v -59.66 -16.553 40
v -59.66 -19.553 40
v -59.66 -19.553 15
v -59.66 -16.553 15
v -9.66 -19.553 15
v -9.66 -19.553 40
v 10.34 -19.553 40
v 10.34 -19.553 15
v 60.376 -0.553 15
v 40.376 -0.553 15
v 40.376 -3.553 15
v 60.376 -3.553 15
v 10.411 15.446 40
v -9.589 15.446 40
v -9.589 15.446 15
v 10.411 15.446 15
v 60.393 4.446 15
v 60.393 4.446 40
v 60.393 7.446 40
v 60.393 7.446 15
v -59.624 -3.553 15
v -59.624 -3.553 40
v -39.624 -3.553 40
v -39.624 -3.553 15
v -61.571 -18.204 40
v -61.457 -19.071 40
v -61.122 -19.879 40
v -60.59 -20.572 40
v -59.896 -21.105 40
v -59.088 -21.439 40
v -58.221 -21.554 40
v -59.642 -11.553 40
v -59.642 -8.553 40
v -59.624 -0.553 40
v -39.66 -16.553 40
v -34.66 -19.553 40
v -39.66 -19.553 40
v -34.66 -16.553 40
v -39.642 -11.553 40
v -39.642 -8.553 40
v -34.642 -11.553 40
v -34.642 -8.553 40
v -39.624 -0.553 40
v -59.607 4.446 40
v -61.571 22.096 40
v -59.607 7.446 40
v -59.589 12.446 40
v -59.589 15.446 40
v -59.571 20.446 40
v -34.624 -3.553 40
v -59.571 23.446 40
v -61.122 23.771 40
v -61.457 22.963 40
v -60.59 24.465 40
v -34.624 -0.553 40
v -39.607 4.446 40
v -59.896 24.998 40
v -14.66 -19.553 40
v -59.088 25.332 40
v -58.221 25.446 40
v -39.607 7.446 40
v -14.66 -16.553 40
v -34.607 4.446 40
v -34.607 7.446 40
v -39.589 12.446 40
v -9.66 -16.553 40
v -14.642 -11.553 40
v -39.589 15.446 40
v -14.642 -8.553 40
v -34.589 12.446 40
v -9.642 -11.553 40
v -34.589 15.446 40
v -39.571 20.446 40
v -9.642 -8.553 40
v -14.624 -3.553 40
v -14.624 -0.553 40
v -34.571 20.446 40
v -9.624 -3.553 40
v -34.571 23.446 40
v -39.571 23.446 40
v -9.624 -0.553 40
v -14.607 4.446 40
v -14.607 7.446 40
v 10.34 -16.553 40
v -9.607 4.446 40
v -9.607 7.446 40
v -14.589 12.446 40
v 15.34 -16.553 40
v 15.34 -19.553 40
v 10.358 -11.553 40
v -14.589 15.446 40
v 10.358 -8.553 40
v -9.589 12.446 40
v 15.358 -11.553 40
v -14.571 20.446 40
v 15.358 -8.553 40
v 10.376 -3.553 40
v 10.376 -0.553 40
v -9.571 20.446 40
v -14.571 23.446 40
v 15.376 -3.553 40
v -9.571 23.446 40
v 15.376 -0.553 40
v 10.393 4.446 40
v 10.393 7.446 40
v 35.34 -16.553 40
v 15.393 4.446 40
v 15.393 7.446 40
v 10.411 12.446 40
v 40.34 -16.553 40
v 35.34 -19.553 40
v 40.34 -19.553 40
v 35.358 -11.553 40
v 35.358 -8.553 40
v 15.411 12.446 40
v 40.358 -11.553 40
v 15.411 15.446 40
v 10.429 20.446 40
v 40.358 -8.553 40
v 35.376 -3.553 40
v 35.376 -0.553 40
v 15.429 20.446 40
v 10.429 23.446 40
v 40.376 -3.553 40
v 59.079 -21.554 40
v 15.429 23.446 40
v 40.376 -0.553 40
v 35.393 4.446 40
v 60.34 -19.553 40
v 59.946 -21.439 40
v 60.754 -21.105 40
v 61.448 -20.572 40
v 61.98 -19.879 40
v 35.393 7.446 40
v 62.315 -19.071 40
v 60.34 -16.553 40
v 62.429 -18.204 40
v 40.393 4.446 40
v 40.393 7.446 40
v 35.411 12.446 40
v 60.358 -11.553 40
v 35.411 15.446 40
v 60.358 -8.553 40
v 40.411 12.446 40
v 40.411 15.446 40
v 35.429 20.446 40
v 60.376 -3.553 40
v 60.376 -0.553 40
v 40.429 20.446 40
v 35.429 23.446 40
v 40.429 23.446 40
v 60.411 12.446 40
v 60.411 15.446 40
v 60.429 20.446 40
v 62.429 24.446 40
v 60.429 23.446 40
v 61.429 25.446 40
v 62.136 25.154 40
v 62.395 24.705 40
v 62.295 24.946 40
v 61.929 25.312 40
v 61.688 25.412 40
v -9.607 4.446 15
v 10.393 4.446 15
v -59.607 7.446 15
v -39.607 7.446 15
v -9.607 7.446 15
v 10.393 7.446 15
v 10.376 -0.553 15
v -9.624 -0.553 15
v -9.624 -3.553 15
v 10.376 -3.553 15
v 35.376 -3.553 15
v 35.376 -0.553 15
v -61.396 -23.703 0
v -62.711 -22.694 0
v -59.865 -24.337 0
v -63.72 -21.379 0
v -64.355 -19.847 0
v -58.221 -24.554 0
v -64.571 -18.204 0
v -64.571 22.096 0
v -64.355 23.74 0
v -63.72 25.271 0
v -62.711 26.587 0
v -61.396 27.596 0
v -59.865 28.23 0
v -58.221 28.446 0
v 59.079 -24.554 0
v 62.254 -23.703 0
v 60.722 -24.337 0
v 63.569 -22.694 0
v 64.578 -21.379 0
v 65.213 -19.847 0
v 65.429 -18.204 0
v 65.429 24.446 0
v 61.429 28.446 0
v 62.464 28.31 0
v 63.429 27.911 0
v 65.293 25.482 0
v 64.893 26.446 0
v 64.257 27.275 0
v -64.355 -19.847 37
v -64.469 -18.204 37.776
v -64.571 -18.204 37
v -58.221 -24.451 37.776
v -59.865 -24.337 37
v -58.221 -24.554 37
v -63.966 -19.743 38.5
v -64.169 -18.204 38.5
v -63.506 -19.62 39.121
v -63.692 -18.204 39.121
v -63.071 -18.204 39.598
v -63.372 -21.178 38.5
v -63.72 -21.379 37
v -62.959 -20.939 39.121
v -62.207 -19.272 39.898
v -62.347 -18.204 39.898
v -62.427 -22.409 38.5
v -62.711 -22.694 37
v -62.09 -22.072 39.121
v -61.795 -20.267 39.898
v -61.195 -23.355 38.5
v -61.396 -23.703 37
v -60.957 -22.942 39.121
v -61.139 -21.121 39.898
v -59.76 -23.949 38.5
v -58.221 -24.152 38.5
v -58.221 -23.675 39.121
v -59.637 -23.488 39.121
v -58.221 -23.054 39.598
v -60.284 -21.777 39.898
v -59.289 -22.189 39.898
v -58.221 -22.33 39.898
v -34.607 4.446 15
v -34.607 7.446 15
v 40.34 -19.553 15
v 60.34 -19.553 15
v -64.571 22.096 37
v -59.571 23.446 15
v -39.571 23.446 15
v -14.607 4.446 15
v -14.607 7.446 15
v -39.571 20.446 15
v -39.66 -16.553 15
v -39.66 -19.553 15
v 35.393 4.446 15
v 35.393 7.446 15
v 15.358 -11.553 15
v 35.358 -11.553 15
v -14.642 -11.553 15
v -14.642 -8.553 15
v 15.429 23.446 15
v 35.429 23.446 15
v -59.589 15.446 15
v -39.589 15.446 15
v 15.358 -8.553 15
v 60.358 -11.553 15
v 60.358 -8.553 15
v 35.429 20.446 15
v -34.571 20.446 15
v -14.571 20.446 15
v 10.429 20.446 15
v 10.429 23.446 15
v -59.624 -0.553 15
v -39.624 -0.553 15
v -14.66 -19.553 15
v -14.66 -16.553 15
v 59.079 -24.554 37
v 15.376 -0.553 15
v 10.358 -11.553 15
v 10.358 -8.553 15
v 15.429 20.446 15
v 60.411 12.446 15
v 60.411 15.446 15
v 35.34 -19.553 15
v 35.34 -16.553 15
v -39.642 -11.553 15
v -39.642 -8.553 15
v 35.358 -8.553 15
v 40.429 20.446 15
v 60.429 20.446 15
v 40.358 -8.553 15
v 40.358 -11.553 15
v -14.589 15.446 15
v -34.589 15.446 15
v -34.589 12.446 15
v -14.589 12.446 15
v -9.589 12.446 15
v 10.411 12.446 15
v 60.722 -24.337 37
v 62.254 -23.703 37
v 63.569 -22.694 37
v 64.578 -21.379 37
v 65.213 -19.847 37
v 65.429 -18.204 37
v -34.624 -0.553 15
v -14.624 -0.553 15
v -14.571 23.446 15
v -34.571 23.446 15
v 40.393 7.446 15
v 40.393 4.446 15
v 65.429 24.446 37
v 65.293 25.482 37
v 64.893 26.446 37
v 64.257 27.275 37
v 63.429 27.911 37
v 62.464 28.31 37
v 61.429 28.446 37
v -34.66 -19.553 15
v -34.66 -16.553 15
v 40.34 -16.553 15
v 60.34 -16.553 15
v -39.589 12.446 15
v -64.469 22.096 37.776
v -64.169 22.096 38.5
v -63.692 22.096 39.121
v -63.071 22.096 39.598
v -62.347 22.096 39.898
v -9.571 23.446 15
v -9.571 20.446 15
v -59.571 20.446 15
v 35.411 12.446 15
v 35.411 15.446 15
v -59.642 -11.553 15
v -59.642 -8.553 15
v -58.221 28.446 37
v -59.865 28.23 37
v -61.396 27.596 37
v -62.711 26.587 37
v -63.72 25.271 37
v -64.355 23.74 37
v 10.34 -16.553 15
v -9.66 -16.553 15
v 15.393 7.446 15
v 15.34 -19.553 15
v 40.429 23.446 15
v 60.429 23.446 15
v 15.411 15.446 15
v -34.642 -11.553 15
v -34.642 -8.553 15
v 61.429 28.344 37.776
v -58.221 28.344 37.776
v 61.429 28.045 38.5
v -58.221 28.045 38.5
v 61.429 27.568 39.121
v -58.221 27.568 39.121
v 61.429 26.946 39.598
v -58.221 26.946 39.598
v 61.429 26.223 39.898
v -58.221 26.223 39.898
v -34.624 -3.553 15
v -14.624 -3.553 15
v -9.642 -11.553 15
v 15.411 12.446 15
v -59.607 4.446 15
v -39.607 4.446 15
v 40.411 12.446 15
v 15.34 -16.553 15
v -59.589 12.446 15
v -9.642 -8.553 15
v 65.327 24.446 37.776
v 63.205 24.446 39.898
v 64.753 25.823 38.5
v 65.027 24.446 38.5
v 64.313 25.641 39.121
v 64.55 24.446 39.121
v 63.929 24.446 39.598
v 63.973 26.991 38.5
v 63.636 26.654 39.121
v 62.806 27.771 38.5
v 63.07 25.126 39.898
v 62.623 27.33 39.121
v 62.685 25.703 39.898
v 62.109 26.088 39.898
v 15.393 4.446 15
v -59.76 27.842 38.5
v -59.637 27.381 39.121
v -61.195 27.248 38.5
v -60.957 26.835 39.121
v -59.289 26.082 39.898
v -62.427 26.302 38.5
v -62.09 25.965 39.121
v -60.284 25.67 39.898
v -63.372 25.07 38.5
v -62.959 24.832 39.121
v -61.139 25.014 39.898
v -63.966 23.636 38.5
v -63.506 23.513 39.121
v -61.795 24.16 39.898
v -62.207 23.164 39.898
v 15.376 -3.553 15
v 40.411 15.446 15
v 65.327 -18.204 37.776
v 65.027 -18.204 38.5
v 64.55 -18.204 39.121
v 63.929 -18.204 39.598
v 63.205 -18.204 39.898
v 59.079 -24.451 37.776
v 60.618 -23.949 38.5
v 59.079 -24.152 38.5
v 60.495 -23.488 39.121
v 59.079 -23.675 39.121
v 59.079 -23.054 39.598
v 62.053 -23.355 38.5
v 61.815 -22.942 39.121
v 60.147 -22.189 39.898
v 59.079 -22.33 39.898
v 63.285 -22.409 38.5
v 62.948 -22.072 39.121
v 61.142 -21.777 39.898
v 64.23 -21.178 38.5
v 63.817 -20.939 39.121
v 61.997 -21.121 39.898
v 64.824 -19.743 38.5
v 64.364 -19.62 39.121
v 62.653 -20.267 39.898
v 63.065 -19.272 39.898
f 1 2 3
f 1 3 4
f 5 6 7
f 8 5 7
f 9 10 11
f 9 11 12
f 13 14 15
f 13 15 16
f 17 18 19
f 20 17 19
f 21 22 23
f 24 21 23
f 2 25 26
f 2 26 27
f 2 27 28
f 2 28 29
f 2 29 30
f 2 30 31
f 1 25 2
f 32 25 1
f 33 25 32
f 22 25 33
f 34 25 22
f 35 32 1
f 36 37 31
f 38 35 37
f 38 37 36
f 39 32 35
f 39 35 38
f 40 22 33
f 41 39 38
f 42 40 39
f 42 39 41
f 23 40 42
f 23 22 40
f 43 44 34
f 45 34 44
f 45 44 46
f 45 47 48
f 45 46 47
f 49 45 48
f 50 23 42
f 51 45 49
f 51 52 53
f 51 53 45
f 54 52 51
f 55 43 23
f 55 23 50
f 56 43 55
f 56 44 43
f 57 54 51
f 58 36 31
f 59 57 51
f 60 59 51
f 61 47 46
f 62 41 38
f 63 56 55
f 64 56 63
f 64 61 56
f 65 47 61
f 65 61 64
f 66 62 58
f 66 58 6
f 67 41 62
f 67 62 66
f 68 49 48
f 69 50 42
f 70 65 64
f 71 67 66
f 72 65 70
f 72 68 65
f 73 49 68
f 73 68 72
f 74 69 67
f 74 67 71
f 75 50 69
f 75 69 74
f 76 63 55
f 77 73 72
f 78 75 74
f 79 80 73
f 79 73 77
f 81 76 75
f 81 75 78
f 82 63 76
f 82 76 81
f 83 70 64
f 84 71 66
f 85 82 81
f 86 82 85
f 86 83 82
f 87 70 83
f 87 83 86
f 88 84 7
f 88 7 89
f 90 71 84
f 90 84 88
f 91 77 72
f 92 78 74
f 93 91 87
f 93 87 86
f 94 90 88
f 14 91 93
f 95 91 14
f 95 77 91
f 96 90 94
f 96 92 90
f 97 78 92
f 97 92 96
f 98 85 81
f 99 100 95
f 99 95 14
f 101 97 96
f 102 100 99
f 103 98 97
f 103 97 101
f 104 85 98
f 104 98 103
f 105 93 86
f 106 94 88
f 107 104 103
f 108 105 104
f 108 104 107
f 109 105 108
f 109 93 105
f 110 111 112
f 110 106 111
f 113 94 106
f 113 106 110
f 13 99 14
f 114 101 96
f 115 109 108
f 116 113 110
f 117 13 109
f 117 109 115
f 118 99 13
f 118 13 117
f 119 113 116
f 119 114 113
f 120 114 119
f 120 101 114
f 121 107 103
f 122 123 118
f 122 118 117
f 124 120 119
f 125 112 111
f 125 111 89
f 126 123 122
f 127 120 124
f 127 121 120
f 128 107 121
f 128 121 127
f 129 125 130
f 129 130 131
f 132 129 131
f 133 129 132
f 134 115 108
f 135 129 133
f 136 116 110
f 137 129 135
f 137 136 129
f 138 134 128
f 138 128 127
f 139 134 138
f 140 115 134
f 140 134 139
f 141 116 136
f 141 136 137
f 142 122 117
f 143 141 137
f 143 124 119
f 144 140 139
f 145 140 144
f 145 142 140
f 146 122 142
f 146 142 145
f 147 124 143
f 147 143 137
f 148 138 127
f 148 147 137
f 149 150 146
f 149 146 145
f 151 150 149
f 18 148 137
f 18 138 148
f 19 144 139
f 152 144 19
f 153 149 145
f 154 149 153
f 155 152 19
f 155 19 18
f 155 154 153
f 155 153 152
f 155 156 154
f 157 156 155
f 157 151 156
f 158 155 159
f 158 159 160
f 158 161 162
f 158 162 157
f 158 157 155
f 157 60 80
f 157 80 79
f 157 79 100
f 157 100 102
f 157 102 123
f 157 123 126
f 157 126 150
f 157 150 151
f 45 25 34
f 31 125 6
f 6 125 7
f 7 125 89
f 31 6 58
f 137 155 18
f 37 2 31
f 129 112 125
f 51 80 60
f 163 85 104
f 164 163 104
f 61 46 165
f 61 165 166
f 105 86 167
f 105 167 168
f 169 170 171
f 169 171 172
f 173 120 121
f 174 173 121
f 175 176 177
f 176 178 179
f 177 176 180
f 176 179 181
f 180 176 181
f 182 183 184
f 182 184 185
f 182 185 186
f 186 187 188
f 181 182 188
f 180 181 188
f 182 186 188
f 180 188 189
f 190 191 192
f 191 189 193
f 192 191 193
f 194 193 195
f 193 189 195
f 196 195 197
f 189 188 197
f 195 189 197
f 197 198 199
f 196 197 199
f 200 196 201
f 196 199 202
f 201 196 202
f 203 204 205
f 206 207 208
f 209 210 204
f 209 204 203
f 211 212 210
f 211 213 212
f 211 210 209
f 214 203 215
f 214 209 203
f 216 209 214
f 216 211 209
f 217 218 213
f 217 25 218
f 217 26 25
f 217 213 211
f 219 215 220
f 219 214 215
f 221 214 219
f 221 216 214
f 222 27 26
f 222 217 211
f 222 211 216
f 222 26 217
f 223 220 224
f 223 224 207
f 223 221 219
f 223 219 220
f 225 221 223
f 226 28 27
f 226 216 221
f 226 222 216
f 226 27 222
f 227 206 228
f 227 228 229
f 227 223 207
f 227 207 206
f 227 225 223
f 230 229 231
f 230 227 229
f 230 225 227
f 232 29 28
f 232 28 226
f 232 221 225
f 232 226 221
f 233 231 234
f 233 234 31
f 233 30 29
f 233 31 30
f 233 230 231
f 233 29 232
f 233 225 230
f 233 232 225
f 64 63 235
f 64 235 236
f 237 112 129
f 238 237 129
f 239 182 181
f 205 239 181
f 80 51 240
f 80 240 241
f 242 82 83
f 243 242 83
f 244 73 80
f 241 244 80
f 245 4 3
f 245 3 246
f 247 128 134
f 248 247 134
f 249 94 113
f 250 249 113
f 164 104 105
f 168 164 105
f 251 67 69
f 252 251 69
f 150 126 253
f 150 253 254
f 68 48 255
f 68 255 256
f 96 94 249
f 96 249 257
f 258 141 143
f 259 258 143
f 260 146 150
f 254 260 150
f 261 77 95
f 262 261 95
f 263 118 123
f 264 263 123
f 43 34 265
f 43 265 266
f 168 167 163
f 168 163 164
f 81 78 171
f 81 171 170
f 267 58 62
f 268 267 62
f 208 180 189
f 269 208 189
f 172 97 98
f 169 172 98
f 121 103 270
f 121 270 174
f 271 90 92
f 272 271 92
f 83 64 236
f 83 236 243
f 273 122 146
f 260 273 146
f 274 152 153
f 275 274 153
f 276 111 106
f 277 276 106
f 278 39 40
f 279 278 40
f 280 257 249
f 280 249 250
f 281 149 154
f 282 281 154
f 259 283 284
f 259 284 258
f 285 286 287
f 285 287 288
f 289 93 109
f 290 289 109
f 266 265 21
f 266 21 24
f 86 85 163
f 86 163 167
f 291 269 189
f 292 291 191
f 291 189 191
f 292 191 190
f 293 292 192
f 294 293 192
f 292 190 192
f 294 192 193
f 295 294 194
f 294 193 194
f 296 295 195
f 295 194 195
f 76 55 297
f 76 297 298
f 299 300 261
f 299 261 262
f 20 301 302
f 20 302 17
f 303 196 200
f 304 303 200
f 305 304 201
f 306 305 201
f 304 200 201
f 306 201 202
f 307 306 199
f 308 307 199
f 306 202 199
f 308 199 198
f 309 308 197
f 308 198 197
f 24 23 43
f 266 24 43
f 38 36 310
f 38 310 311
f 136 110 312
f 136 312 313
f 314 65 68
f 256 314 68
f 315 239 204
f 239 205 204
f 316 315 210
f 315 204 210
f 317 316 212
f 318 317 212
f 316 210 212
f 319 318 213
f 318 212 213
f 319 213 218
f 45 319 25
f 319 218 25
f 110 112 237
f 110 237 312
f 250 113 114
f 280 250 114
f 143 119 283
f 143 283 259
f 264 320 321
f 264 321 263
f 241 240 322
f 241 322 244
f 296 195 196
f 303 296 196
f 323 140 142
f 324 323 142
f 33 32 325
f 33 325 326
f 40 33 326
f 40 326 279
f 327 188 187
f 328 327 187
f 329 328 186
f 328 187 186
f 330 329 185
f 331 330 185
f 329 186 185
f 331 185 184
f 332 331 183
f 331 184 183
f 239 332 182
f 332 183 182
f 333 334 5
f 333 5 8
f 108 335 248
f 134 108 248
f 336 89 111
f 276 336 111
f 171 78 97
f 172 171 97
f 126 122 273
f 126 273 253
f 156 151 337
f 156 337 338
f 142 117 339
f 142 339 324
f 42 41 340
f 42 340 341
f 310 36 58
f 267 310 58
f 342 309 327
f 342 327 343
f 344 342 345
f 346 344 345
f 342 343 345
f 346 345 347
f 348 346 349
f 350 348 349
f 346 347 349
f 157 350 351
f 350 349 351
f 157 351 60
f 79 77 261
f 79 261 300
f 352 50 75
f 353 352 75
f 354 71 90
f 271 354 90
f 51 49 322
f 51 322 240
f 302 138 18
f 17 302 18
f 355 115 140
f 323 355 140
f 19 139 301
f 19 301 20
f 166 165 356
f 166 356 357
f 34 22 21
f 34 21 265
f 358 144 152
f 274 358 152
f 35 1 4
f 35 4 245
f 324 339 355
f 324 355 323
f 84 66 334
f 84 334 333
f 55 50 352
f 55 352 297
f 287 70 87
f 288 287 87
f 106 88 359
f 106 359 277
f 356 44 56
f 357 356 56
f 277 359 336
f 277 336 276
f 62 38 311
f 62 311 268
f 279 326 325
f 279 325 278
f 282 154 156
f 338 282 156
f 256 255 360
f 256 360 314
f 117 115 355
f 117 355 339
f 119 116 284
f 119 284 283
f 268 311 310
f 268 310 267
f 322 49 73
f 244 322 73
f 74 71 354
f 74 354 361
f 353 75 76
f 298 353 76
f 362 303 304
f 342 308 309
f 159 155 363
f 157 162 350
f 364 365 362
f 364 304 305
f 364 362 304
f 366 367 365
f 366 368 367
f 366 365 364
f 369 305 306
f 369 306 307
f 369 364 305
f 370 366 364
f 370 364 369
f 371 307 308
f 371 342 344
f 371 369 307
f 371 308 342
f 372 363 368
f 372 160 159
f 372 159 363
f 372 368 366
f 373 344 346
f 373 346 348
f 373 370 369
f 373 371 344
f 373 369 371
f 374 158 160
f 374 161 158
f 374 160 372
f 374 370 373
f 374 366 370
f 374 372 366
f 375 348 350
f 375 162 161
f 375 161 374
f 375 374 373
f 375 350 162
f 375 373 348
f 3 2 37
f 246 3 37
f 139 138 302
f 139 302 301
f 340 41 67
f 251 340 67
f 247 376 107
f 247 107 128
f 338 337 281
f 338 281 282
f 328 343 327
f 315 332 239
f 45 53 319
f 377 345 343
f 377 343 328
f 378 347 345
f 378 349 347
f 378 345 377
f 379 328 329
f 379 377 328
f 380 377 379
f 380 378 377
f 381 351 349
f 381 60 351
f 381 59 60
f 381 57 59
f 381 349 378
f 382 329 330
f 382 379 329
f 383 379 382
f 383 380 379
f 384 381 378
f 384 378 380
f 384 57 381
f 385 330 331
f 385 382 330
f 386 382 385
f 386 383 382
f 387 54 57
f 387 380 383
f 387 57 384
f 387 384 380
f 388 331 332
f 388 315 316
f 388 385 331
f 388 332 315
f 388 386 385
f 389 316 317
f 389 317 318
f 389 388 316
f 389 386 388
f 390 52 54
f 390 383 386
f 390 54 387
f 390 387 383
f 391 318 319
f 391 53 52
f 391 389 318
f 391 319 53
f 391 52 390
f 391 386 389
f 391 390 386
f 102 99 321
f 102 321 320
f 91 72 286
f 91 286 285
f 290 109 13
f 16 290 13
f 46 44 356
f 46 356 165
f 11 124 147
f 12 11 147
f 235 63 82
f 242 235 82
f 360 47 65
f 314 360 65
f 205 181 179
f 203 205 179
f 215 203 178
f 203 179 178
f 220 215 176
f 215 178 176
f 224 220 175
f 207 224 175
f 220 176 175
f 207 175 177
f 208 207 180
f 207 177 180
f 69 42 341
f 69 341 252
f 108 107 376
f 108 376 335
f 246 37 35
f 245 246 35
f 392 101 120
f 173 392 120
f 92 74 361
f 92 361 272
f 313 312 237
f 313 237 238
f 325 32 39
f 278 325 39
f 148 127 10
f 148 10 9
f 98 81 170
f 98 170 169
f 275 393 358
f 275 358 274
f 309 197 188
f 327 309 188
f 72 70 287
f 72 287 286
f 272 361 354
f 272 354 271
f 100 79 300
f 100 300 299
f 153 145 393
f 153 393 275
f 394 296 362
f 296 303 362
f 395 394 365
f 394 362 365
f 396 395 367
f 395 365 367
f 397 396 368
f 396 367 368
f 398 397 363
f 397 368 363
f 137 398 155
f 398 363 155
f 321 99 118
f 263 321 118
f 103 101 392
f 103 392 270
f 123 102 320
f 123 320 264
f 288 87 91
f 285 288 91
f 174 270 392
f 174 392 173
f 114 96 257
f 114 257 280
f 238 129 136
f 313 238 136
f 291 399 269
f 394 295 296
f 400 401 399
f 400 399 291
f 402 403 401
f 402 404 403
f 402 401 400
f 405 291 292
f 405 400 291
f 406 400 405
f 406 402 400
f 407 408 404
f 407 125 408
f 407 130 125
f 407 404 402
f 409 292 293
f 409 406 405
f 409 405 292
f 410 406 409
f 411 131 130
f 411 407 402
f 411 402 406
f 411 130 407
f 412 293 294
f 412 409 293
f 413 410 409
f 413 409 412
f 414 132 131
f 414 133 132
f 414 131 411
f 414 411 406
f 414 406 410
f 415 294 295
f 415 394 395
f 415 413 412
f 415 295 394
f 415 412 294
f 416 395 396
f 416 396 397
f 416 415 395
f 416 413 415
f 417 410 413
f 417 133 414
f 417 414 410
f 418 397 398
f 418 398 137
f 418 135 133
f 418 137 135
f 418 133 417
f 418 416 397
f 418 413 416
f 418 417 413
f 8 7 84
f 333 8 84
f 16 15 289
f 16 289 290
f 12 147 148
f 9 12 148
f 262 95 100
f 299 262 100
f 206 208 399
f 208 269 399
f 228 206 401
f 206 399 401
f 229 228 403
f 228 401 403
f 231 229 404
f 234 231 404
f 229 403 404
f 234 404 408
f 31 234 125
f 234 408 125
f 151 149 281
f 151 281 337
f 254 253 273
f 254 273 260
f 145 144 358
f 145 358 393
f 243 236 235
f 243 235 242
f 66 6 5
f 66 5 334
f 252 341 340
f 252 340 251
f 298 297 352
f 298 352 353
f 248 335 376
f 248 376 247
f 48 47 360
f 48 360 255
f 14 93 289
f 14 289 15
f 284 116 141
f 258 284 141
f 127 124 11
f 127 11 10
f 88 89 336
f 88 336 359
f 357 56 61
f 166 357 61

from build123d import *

# Parameters (mm, degrees)
F1_DEPTH = 40
F2_W     = 20
F2_H     = 3
F3_DEPTH = 25
F4_R     = 3


with BuildPart() as f1:
    # F0 (on Top) → F1 (new body)
    with BuildSketch(Plane.XY):
        with BuildLine():
            Line((61.428977, 28.446451), (-58.221023, 28.446451))
            ThreePointArc((-58.221023, 28.446451), (-62.711151, 26.586579), (-64.571023, 22.096451))
            Line((-64.571023, 22.096451), (-64.571023, -18.203549))
            ThreePointArc((-64.571023, -18.203549), (-62.711151, -22.693677), (-58.221023, -24.553549))
            Line((-58.221023, -24.553549), (59.078977, -24.553549))
            ThreePointArc((59.078977, -24.553549), (63.569105, -22.693677), (65.428977, -18.203549))
            Line((65.428977, -18.203549), (65.428977, 24.446451))
            ThreePointArc((65.428977, 24.446451), (64.257404, 27.274878), (61.428977, 28.446451))
        make_face()
    extrude(amount=F1_DEPTH)

    # F2 (on face) → F3 (cut)
    with BuildSketch(Plane.XY.offset(40)):
        with Locations((-49.571023, 21.946451)):
            Rectangle(F2_W, F2_H)
        with Locations((-49.588825, 13.946471)):
            Rectangle(F2_W, F2_H)
        with Locations((-49.606627, 5.94649)):
            Rectangle(F2_W, F2_H)
        with Locations((-49.624429, -2.05349)):
            Rectangle(F2_W, F2_H)
        with Locations((-49.642231, -10.05347)):
            Rectangle(F2_W, F2_H)
        with Locations((-49.660033, -18.05345)):
            Rectangle(F2_W, F2_H)
        with Locations((-24.571023, 21.946451)):
            Rectangle(F2_W, F2_H)
        with Locations((-24.588825, 13.946471)):
            Rectangle(F2_W, F2_H)
        with Locations((-24.606627, 5.94649)):
            Rectangle(F2_W, F2_H)
        with Locations((-24.624429, -2.05349)):
            Rectangle(F2_W, F2_H)
        with Locations((-24.642231, -10.05347)):
            Rectangle(F2_W, F2_H)
        with Locations((-24.660033, -18.05345)):
            Rectangle(F2_W, F2_H)
        with Locations((0.428977, 21.946451)):
            Rectangle(F2_W, F2_H)
        with Locations((0.411175, 13.946471)):
            Rectangle(F2_W, F2_H)
        with Locations((0.393373, 5.94649)):
            Rectangle(F2_W, F2_H)
        with Locations((0.375571, -2.05349)):
            Rectangle(F2_W, F2_H)
        with Locations((0.357769, -10.05347)):
            Rectangle(F2_W, F2_H)
        with Locations((0.339967, -18.05345)):
            Rectangle(F2_W, F2_H)
        with Locations((25.428977, 21.946451)):
            Rectangle(F2_W, F2_H)
        with Locations((25.411175, 13.946471)):
            Rectangle(F2_W, F2_H)
        with Locations((25.393373, 5.94649)):
            Rectangle(F2_W, F2_H)
        with Locations((25.375571, -2.05349)):
            Rectangle(F2_W, F2_H)
        with Locations((25.357769, -10.05347)):
            Rectangle(F2_W, F2_H)
        with Locations((25.339967, -18.05345)):
            Rectangle(F2_W, F2_H)
        with Locations((50.428977, 21.946451)):
            Rectangle(F2_W, F2_H)
        with Locations((50.411175, 13.946471)):
            Rectangle(F2_W, F2_H)
        with Locations((50.393373, 5.94649)):
            Rectangle(F2_W, F2_H)
        with Locations((50.375571, -2.05349)):
            Rectangle(F2_W, F2_H)
        with Locations((50.357769, -10.05347)):
            Rectangle(F2_W, F2_H)
        with Locations((50.339967, -18.05345)):
            Rectangle(F2_W, F2_H)
    extrude(amount=-F3_DEPTH, mode=Mode.SUBTRACT)

    # F4
    f4_edges = [f1.edges().sort_by_distance(p)[0] for p in [
        (1.603977, 28.446451, 40),
    ]]
    fillet(f4_edges, radius=F4_R)


solid = f1.part
